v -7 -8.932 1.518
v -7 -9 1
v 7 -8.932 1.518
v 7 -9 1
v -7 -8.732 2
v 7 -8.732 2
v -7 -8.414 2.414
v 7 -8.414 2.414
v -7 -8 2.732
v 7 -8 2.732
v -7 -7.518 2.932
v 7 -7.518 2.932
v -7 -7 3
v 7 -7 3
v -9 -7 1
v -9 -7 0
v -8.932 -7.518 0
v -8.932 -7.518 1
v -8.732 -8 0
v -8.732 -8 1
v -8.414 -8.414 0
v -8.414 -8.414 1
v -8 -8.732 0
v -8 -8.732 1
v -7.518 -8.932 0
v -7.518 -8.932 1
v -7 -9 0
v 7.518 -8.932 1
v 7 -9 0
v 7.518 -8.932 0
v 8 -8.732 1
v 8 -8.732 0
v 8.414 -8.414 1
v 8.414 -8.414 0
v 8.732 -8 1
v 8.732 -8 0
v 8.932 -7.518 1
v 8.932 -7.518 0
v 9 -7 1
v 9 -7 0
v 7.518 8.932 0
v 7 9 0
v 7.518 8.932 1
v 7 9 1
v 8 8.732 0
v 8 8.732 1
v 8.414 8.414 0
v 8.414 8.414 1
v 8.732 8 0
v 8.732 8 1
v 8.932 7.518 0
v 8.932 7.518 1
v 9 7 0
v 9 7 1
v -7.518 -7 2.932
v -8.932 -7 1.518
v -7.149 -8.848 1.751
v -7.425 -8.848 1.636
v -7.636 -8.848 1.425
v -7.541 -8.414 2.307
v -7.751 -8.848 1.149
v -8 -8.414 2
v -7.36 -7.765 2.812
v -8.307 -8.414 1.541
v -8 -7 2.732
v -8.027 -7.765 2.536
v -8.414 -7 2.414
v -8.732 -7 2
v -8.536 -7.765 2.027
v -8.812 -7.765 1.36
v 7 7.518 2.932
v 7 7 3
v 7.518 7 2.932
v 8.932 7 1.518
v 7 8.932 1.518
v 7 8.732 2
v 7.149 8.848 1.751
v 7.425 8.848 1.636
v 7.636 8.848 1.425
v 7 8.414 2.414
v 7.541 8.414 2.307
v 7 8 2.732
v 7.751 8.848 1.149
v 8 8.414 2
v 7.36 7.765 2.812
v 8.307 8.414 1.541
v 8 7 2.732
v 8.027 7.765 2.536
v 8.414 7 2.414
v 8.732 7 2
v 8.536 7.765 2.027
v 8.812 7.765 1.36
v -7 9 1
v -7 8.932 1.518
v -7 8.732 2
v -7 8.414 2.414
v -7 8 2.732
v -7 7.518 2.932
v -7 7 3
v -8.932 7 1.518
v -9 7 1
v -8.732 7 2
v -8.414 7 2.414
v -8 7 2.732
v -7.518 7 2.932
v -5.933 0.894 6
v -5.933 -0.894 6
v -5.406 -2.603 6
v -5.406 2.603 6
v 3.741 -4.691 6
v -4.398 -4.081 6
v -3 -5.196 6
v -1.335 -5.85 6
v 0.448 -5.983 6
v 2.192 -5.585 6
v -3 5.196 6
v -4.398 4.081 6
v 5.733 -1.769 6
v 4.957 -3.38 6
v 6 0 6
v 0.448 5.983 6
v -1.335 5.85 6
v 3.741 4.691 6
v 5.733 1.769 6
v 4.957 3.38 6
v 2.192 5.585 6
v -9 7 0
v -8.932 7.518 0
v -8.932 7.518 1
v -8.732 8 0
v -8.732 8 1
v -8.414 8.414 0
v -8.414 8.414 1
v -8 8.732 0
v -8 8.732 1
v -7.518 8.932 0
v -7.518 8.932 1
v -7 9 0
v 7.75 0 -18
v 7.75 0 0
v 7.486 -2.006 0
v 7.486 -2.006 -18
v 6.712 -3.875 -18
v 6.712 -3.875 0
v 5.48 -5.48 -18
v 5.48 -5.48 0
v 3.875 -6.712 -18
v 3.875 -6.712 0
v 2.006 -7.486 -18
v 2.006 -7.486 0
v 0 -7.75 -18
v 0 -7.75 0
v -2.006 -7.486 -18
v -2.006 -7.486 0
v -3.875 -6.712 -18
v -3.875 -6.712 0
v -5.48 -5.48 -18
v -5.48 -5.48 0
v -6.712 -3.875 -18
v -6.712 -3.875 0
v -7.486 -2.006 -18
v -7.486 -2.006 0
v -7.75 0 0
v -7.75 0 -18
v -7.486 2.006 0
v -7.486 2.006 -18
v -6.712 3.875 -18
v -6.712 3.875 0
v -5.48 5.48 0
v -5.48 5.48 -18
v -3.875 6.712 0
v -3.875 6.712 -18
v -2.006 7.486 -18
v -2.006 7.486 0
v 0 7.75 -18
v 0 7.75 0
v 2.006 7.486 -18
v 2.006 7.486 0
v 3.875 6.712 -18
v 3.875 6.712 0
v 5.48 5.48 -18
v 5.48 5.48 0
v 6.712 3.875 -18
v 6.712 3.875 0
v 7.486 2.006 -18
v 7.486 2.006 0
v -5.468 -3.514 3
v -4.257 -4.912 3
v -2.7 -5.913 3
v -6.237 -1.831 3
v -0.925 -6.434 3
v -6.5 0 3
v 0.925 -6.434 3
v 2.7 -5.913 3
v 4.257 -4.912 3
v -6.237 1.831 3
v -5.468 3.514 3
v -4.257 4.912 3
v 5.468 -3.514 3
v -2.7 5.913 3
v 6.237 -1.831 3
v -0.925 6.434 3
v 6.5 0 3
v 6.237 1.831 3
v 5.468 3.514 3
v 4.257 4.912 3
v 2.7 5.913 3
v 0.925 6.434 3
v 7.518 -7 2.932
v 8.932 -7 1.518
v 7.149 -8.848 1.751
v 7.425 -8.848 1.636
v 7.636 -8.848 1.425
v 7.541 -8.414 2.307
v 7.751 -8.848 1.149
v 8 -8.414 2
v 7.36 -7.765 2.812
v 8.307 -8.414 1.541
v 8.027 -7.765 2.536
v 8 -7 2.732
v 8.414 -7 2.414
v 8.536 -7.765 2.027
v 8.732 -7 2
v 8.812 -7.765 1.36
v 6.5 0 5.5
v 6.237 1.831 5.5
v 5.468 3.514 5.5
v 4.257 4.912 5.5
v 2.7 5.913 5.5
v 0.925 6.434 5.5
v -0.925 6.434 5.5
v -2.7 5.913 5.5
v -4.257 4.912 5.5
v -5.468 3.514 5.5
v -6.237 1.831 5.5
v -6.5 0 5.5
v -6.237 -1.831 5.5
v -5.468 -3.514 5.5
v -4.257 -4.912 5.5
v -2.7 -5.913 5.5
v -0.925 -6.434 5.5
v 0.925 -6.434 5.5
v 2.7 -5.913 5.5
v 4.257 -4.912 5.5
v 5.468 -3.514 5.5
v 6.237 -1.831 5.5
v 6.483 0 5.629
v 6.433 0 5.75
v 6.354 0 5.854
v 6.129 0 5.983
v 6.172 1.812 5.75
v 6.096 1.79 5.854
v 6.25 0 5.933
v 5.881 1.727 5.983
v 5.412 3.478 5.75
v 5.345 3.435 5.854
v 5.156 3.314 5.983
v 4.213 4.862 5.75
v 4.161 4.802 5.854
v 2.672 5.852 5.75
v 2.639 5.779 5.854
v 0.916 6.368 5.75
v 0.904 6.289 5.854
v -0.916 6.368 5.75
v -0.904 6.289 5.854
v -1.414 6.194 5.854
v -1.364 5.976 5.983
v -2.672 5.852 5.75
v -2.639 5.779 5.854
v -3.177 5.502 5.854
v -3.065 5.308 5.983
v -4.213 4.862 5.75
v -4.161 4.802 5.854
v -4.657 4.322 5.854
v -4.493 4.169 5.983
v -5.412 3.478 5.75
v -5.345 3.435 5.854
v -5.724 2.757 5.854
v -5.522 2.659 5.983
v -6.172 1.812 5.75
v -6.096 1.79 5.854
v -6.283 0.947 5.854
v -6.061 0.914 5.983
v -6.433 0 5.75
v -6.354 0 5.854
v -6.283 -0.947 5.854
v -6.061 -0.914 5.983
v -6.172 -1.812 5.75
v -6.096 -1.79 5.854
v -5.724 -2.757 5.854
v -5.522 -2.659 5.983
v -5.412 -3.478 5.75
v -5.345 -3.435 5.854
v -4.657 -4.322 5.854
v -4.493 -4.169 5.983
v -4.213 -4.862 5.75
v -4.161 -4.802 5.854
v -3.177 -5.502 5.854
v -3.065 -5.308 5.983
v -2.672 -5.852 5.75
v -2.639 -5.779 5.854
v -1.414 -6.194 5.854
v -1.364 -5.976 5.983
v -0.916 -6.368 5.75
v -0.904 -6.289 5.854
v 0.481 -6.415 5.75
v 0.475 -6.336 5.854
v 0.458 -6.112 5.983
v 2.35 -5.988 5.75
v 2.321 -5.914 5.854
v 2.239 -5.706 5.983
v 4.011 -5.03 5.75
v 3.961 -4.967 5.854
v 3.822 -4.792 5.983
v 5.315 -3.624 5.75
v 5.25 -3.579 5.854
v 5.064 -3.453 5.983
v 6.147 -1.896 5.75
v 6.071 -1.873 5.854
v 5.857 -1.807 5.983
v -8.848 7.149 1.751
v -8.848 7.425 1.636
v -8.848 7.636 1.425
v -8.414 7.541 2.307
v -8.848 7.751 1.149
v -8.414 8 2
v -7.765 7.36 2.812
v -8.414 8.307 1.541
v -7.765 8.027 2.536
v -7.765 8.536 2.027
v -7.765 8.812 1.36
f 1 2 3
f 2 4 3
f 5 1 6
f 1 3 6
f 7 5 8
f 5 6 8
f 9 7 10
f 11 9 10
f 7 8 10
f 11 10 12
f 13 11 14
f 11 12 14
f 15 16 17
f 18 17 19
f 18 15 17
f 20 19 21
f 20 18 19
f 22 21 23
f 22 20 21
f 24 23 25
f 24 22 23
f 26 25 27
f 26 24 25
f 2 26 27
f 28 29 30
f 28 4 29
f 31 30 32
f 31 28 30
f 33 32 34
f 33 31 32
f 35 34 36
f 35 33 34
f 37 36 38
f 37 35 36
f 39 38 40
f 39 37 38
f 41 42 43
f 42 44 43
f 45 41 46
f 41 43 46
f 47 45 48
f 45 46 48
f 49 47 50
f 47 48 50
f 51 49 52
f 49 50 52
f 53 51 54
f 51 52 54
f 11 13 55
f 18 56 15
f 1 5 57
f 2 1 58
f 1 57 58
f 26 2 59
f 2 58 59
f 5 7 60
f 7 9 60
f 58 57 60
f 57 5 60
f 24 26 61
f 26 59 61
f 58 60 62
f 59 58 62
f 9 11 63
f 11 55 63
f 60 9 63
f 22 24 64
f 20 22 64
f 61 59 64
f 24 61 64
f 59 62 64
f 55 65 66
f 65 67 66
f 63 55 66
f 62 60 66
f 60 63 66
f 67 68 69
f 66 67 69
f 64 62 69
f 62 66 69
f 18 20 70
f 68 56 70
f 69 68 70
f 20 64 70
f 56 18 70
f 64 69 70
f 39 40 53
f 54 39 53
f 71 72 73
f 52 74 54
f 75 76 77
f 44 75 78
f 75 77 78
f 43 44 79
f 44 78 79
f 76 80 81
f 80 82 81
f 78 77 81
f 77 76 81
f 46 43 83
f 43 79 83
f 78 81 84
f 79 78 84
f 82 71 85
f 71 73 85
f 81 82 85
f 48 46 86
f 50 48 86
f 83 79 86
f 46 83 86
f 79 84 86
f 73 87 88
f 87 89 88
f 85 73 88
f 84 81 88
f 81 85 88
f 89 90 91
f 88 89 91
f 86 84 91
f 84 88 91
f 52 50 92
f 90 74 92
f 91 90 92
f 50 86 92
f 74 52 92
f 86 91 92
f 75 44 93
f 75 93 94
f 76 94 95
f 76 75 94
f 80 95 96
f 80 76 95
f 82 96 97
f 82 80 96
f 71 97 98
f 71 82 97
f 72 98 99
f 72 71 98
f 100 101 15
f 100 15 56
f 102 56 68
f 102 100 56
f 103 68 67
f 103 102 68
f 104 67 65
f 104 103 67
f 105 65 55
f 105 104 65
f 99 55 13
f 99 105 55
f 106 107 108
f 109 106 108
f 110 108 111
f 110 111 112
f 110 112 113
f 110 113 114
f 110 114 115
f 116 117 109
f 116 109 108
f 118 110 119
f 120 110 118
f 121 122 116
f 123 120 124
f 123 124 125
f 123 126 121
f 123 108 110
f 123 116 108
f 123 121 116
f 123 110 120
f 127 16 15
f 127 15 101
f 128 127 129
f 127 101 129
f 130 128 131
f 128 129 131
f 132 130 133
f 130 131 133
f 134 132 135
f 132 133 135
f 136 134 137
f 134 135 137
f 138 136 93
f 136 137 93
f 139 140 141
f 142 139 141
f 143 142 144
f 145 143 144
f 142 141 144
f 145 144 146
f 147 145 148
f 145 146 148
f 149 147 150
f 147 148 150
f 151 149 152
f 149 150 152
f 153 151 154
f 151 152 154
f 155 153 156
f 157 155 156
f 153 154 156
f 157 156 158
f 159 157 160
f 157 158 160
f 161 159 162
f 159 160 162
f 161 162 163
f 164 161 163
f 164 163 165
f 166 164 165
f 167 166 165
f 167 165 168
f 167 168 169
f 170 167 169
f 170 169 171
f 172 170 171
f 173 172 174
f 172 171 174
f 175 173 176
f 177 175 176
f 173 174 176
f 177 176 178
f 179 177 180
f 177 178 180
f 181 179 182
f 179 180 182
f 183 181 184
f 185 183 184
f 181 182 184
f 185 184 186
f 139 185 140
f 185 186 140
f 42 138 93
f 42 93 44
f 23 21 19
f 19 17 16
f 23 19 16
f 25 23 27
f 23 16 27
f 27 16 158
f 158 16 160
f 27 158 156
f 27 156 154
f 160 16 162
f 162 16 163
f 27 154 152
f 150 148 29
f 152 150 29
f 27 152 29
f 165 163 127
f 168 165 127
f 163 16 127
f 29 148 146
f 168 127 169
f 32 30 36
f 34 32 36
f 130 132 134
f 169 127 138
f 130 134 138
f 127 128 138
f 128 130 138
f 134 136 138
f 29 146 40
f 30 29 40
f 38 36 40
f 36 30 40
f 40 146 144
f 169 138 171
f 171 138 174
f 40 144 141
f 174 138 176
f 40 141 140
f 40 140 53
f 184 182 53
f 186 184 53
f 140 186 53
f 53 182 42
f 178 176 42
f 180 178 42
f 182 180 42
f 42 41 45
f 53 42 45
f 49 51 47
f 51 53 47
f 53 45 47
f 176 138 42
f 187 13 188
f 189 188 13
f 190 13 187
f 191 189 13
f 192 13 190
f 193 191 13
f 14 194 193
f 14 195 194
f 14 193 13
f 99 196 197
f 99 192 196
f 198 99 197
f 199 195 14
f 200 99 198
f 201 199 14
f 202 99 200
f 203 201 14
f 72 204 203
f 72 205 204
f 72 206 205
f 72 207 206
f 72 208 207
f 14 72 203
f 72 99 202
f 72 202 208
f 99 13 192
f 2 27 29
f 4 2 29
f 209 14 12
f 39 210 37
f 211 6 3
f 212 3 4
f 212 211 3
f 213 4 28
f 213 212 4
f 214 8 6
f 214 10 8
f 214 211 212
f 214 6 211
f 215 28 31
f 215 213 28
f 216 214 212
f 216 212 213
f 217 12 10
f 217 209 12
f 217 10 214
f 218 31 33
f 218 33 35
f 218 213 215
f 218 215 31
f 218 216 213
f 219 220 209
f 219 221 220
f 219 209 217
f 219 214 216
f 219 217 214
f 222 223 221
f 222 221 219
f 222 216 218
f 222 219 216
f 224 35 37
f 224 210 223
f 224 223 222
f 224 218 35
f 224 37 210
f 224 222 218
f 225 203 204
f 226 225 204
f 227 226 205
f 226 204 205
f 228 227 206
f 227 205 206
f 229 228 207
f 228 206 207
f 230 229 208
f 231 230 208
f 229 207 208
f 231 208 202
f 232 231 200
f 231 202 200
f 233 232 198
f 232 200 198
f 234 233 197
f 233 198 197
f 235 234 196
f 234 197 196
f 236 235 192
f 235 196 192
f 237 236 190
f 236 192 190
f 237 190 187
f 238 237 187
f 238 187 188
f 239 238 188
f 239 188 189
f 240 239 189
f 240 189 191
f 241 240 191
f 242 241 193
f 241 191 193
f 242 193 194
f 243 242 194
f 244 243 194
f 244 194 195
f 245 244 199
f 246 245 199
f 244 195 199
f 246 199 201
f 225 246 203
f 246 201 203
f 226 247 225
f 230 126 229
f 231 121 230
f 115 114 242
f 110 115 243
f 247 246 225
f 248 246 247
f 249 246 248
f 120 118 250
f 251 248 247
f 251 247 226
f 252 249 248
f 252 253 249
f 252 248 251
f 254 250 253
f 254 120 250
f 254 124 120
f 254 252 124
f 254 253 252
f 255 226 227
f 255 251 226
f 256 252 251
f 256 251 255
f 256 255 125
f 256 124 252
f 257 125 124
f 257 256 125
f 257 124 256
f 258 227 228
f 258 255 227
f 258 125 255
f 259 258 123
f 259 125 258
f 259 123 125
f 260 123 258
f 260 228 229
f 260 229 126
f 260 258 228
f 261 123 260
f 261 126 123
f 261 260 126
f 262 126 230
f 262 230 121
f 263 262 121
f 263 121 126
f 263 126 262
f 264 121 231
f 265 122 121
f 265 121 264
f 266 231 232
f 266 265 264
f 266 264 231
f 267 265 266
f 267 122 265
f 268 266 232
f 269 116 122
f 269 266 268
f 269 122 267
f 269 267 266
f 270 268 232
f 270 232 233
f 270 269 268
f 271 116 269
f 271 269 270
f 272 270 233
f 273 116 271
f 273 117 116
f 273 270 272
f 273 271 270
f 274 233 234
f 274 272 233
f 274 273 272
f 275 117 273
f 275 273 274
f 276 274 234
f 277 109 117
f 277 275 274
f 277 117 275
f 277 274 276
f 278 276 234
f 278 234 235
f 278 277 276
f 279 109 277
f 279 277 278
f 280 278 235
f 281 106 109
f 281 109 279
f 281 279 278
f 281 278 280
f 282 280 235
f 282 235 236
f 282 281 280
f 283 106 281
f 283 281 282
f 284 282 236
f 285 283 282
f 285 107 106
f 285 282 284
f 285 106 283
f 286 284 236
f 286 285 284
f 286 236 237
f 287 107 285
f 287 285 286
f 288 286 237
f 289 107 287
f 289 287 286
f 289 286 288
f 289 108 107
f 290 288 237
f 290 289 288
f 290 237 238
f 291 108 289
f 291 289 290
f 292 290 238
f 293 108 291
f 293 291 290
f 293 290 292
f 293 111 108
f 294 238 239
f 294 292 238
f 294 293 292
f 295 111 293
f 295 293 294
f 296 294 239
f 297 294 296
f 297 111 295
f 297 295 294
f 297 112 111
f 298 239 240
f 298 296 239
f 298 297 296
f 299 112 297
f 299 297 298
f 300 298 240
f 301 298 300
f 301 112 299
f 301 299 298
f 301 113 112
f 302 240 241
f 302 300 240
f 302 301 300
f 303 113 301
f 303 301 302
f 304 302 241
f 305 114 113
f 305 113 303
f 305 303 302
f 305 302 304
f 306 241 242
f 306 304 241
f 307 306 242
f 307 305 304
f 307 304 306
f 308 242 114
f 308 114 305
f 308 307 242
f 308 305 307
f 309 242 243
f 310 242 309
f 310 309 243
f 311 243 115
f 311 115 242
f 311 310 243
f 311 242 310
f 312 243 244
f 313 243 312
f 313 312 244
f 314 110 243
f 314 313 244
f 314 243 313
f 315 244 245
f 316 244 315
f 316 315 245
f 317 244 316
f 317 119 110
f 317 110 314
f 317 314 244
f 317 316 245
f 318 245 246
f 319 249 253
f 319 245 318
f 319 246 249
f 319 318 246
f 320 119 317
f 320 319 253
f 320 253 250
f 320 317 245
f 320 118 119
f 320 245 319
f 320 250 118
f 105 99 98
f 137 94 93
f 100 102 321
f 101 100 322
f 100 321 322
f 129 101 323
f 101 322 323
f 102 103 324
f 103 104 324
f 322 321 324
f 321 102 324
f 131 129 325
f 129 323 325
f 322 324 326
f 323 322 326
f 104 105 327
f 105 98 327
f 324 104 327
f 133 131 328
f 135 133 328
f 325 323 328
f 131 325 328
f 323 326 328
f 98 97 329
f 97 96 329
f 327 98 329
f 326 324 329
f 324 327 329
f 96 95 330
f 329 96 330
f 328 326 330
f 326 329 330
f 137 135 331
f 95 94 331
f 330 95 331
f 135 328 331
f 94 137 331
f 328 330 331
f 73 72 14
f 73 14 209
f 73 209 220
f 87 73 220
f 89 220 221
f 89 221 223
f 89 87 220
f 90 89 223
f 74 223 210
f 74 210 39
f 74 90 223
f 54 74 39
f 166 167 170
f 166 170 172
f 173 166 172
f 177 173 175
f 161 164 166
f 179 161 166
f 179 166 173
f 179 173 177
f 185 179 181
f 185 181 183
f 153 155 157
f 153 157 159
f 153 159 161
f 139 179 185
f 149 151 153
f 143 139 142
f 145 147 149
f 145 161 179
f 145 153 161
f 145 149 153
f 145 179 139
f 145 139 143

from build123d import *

# Parameters (mm, degrees)
F0_W     = 18
F0_H     = 18
F1_DEPTH = 3
F2_R     = 6.5
F3_DEPTH = 3
F4_R     = 2
F5_R     = 0.5
F6_R     = 7.75
F7_DEPTH = 18


with BuildPart() as f1:
    # F0 (on Top) → F1 (new body)
    with BuildSketch(Plane.XY):
        Rectangle(F0_W, F0_H)
    extrude(amount=F1_DEPTH)

    # F2 (on face) → F3 (join)
    with BuildSketch(Plane.XY.offset(3)):
        Circle(F2_R)
    extrude(amount=F3_DEPTH)

    # F4
    f4_edges = [f1.edges().sort_by_distance(p)[0] for p in [
        (9, 0, 3),
        (0, 9, 3),
        (-9, 0, 3),
        (0, -9, 3),
        (-9, -9, 1.5),
        (-9, 9, 1.5),
        (9, -9, 1.5),
        (9, 9, 1.5),
    ]]
    fillet(f4_edges, radius=F4_R)

    # F5
    f5_edges = [f1.edges().sort_by_distance(p)[0] for p in [
        (-6.5, 0, 6),
    ]]
    fillet(f5_edges, radius=F5_R)

    # F6 (on face) → F7 (join)
    with BuildSketch(Plane(origin=(0, 0, 0), x_dir=(1, 0, 0), z_dir=(0, 0, -1))):
        Circle(F6_R)
    extrude(amount=F7_DEPTH)


solid = f1.part
